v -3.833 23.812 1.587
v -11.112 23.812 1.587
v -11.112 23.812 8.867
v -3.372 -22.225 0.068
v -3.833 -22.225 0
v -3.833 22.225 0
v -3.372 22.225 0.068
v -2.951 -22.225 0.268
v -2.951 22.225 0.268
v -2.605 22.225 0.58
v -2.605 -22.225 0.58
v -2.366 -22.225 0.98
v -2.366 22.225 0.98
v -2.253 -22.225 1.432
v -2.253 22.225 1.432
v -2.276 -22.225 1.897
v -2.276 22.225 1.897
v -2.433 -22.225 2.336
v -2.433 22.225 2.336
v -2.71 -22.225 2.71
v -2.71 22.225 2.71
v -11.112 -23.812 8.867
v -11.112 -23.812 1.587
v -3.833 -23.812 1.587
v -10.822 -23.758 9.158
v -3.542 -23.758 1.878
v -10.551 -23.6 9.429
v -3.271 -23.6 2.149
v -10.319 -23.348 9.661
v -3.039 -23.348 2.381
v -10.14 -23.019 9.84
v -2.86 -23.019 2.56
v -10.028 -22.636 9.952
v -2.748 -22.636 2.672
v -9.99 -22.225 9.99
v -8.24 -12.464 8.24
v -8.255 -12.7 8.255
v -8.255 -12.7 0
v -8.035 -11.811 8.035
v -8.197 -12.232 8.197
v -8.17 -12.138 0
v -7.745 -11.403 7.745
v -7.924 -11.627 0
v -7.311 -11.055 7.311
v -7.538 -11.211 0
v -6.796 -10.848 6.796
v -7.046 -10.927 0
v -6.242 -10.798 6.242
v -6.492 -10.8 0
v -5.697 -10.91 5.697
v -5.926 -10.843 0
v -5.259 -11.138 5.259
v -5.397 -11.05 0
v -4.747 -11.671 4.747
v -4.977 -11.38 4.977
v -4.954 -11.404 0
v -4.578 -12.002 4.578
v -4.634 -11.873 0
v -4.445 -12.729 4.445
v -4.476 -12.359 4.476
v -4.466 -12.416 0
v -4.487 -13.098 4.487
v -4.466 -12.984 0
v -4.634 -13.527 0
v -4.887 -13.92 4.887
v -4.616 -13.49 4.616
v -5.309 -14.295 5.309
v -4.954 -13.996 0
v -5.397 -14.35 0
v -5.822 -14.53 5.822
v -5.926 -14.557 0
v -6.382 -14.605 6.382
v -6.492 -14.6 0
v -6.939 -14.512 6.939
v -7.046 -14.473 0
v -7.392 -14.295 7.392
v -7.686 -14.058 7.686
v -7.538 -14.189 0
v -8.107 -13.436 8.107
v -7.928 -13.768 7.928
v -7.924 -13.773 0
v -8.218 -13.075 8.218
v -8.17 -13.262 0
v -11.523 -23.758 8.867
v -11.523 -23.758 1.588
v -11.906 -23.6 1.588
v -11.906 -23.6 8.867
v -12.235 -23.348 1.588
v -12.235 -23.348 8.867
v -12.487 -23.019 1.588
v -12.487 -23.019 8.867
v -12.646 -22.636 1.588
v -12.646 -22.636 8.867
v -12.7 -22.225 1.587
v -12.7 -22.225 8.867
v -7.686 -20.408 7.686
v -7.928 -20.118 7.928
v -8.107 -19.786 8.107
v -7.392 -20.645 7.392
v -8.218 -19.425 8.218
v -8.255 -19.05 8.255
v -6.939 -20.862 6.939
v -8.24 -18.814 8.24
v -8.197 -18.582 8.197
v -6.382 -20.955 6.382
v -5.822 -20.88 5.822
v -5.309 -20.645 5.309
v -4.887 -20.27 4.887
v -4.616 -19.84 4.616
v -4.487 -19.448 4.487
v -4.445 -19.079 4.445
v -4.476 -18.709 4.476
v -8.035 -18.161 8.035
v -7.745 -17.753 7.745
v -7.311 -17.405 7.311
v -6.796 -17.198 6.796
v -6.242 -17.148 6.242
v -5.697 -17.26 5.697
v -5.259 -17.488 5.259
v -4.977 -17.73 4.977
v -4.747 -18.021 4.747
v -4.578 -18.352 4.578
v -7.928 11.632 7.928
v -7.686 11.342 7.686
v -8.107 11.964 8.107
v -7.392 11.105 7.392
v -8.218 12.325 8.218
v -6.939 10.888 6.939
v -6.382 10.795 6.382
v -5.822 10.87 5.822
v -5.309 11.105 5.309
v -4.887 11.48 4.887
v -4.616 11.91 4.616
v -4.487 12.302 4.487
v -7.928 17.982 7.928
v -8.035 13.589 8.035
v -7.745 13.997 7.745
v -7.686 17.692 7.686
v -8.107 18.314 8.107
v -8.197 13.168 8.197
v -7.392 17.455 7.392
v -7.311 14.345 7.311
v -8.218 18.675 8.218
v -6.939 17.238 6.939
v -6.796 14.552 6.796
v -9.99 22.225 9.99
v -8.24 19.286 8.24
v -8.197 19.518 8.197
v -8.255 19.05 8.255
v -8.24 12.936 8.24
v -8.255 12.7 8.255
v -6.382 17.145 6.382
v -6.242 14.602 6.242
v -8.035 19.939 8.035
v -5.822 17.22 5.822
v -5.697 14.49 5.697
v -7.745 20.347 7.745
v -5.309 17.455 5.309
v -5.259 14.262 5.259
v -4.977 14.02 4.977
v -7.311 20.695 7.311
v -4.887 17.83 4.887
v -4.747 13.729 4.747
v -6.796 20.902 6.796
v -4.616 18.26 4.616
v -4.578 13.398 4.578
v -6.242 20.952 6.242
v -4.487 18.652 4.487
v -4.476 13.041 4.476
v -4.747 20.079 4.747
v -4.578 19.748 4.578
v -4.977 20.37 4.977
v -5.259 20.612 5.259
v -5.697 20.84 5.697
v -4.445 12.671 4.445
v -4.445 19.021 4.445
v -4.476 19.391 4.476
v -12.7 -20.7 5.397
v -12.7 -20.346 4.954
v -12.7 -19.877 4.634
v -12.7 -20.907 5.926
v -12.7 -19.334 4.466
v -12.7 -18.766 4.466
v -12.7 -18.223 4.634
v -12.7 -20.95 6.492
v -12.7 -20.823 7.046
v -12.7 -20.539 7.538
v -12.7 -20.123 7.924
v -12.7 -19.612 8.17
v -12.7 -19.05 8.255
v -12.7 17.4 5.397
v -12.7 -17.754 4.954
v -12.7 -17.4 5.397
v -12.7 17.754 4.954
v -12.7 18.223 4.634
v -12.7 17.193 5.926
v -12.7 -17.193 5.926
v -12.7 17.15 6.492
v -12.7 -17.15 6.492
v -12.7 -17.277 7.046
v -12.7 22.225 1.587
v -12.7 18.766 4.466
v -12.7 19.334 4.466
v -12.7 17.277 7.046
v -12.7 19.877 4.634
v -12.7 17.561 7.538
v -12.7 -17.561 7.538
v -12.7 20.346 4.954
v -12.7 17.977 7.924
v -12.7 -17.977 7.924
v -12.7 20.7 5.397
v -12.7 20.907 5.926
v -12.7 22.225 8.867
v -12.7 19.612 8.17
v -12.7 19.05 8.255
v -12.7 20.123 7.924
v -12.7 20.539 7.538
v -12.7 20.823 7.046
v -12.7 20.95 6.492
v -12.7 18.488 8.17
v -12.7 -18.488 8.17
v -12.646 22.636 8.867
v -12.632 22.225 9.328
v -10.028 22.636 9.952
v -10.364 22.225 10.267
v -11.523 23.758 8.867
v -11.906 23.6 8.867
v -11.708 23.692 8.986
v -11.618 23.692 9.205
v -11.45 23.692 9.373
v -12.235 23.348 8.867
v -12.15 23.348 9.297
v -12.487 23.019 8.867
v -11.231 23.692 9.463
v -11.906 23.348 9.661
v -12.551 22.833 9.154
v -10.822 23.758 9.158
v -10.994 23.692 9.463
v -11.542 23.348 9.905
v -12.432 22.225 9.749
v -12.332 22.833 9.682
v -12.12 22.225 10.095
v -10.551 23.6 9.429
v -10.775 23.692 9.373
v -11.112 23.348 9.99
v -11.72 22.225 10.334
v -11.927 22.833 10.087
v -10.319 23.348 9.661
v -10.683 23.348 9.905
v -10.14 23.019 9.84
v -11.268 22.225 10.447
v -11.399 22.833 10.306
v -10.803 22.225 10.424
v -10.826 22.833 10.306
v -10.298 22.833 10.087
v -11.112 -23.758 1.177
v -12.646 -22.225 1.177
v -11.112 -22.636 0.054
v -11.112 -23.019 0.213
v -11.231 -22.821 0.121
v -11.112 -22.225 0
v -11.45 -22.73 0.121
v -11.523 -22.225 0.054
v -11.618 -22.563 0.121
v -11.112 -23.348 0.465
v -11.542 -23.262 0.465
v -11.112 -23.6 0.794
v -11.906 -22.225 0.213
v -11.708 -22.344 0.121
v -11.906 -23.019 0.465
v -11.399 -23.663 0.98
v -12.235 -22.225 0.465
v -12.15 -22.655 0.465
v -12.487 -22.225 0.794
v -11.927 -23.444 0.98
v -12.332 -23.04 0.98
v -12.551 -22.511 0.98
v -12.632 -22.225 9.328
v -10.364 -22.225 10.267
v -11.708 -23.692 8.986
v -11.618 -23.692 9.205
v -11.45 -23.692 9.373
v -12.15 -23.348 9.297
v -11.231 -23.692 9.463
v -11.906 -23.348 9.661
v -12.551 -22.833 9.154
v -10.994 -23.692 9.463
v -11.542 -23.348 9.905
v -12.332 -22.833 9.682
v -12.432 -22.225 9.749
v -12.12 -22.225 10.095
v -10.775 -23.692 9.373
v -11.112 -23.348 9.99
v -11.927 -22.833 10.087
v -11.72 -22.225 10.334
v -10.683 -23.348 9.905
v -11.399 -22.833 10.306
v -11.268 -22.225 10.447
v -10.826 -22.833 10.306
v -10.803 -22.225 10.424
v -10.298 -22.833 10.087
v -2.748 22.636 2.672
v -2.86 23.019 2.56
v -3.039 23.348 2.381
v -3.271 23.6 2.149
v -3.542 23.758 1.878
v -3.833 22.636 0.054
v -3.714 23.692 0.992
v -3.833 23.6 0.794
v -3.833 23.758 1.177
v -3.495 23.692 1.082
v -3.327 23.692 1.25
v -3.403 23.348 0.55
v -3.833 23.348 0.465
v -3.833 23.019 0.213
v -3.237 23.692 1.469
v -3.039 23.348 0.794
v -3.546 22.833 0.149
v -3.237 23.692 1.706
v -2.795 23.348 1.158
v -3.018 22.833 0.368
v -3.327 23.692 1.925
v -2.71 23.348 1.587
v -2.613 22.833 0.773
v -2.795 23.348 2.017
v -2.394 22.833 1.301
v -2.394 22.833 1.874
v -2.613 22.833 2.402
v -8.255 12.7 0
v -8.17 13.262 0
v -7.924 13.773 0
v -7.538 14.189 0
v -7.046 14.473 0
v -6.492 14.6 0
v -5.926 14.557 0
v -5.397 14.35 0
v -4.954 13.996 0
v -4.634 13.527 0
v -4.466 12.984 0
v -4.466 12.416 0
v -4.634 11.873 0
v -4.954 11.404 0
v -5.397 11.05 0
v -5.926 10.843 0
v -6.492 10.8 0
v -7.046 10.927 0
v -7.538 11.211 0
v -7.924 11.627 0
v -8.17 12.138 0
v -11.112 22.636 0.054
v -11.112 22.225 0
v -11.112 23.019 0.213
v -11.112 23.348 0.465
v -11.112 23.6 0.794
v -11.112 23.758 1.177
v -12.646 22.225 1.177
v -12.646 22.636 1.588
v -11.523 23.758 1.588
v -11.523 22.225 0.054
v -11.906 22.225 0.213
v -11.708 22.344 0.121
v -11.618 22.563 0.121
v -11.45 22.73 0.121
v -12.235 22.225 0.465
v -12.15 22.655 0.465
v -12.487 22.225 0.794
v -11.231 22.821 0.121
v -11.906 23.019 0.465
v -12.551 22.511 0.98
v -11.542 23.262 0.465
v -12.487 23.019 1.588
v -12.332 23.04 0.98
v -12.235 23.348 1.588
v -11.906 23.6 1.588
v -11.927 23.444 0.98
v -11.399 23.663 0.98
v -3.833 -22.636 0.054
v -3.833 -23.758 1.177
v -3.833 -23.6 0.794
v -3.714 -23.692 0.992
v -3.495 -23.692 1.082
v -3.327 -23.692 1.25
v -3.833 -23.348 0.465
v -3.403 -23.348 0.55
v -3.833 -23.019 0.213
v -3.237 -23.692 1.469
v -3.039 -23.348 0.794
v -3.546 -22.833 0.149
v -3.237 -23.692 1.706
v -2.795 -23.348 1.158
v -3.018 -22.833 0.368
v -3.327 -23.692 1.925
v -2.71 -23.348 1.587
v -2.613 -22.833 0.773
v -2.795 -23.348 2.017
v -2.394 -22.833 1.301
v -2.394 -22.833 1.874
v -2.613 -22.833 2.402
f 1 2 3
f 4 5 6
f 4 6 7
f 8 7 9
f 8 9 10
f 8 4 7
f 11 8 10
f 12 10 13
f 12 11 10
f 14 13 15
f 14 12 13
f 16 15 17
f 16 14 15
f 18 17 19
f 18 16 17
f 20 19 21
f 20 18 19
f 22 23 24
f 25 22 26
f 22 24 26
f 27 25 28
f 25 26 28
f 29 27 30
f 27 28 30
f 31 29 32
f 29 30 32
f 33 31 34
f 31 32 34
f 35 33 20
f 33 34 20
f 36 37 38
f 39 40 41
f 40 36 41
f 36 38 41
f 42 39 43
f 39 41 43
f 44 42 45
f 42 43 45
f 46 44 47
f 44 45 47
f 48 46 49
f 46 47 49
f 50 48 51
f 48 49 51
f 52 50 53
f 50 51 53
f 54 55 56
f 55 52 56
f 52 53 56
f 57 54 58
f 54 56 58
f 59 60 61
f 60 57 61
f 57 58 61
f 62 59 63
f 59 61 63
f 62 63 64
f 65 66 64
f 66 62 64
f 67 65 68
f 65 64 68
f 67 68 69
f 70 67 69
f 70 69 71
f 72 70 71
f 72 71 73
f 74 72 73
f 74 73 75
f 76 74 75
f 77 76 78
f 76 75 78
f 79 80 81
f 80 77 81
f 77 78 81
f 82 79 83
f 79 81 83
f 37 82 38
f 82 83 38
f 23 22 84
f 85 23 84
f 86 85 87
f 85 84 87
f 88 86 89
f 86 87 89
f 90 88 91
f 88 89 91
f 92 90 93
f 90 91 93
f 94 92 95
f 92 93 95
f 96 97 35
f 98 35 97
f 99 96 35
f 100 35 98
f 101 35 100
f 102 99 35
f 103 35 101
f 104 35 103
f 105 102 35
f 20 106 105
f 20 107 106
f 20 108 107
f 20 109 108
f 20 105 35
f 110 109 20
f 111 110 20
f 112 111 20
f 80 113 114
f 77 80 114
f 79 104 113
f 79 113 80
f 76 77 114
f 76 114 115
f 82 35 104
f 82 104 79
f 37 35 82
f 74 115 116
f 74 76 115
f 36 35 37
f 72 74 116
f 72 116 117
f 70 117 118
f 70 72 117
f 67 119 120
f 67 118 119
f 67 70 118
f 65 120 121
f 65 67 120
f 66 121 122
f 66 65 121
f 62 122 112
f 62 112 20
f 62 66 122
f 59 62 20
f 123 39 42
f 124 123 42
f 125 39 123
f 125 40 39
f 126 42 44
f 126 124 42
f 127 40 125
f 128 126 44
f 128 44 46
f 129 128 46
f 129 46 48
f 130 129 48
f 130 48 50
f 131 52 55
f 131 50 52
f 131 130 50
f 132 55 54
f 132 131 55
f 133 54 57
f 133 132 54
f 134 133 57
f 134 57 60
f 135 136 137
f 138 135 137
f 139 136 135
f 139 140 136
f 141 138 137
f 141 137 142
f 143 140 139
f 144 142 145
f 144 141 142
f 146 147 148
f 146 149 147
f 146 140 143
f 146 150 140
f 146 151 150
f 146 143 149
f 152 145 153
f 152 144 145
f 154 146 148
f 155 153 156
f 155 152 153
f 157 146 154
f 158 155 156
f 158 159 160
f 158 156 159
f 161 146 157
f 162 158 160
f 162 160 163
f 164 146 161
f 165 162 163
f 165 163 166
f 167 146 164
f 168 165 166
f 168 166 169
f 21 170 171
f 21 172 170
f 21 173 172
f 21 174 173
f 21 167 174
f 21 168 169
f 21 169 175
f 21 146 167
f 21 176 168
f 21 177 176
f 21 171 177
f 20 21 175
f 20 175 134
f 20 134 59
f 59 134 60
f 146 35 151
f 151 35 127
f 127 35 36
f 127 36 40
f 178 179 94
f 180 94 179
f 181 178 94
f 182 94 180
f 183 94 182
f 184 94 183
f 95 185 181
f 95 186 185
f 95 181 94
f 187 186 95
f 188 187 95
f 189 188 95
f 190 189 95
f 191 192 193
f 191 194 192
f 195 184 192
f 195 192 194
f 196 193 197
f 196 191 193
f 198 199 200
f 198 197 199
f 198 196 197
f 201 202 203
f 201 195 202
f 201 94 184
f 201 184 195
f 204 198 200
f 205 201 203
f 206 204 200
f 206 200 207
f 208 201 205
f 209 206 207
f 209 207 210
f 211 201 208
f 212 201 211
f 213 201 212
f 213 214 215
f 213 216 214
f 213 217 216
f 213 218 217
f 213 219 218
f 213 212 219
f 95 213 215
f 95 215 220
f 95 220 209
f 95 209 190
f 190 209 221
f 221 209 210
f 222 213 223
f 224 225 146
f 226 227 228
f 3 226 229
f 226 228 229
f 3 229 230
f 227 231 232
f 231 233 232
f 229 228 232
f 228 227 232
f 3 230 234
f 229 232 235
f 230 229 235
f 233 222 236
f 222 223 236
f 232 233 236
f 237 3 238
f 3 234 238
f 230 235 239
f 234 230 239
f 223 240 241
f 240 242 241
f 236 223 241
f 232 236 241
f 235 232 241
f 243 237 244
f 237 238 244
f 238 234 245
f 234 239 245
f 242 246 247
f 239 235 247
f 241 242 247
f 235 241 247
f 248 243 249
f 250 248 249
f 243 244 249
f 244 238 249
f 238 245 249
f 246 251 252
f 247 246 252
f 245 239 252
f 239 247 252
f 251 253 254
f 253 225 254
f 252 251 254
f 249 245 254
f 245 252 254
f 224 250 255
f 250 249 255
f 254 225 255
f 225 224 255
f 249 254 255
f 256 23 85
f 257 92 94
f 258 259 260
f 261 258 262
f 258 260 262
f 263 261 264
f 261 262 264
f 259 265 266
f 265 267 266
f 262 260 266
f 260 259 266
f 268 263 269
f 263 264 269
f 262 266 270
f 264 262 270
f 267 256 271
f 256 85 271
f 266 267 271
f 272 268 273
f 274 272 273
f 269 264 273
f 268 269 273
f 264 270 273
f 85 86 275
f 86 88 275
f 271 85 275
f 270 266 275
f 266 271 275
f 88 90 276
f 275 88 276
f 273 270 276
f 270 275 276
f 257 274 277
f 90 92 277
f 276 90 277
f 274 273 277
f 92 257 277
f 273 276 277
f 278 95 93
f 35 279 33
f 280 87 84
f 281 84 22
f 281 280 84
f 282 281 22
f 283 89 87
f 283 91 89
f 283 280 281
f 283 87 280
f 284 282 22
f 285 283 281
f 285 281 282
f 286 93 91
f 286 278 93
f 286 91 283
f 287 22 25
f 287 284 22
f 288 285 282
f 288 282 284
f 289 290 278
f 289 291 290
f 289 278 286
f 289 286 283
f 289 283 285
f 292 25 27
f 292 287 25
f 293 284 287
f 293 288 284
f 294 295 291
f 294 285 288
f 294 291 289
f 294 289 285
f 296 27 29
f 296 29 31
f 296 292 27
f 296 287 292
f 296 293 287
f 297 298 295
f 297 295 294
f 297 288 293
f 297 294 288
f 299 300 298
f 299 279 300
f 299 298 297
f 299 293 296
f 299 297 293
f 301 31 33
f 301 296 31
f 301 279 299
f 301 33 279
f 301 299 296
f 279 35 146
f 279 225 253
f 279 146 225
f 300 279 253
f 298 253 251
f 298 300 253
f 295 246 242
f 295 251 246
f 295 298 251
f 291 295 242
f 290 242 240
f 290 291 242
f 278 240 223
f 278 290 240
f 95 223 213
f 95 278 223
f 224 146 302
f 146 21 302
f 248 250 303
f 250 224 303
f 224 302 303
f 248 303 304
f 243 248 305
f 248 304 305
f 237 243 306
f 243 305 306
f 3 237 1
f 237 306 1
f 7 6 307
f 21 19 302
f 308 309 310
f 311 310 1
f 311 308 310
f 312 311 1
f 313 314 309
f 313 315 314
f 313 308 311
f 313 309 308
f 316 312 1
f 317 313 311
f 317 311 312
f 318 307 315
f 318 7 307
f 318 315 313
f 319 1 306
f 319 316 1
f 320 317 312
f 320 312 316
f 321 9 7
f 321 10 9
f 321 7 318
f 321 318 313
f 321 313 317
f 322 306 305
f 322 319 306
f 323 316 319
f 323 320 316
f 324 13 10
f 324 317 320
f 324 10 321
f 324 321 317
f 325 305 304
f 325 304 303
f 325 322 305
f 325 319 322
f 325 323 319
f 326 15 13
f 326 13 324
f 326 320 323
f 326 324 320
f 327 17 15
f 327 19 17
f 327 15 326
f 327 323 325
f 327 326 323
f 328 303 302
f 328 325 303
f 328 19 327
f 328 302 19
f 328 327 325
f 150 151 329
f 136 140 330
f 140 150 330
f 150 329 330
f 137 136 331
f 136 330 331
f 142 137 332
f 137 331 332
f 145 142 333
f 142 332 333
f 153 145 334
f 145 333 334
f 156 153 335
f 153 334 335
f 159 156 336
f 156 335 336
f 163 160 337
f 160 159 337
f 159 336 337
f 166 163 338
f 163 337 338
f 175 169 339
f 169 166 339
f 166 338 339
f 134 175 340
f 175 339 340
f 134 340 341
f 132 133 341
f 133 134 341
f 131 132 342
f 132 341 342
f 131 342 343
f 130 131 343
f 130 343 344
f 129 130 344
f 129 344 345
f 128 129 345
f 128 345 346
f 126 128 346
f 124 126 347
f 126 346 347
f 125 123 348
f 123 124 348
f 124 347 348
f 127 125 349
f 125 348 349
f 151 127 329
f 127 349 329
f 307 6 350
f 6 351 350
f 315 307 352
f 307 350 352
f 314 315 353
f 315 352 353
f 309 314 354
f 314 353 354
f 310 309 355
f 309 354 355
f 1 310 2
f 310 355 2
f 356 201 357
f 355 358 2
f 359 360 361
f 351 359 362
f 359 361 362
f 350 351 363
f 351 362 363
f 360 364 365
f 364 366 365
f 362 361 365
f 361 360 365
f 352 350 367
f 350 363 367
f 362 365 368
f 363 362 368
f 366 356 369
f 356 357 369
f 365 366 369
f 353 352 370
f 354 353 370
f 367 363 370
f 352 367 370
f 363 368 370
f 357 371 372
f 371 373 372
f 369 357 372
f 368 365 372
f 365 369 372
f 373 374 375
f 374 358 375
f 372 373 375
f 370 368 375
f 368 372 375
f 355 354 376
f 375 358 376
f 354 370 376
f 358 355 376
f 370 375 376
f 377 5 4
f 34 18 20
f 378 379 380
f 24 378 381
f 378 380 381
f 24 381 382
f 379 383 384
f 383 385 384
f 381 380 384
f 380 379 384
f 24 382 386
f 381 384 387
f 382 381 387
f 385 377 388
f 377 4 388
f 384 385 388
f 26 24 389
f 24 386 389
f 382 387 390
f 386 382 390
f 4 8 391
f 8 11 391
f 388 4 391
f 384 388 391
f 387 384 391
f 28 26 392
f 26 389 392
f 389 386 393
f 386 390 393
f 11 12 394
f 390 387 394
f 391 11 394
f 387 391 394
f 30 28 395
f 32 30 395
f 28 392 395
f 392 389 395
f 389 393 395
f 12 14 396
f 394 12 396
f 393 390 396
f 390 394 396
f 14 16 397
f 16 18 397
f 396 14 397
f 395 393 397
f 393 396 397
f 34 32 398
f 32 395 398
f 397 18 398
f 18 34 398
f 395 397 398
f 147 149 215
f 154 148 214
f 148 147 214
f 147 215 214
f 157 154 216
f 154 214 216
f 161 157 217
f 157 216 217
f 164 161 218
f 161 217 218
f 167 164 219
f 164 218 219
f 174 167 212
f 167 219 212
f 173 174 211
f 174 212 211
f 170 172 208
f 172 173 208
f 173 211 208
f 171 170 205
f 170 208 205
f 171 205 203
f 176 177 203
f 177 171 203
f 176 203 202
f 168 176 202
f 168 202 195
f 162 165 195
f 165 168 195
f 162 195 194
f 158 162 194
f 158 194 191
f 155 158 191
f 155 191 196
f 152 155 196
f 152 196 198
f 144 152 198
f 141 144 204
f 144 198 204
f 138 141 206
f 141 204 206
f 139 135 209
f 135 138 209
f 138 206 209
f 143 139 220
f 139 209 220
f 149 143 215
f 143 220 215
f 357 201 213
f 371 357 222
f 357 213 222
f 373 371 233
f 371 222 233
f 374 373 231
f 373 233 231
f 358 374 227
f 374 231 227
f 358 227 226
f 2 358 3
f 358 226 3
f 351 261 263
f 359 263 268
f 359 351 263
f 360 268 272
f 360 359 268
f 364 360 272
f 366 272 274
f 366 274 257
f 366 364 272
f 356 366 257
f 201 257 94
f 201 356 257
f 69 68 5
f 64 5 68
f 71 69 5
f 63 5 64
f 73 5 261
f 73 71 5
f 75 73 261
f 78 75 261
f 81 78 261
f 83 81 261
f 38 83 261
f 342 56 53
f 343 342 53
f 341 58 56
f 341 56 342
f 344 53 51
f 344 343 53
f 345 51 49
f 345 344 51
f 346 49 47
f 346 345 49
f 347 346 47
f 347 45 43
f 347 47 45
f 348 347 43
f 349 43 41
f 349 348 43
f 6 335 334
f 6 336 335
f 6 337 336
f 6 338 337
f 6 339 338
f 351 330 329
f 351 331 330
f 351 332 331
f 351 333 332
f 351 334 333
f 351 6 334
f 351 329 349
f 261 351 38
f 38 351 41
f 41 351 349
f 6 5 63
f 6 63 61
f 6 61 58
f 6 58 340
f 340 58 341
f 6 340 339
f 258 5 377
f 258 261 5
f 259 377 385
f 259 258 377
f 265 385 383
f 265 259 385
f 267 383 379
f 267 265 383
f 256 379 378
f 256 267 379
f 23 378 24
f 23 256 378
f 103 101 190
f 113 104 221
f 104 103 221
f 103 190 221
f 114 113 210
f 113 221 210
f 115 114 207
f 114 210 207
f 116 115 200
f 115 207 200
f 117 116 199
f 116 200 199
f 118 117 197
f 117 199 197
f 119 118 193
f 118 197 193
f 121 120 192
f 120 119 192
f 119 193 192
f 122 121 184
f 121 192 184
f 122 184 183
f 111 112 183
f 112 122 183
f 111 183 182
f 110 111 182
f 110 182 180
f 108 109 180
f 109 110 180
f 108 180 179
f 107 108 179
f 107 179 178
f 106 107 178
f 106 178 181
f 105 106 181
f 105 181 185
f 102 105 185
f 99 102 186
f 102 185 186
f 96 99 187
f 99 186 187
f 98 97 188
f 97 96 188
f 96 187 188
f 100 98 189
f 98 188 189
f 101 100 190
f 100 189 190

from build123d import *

# Parameters (mm, degrees)
BOSS_EXTRUDE1_DEPTH = 23.8125
SKETCH2_R           = 1.905
CUT_EXTRUDE1_DEPTH  = 30.826417087
SKETCH3_R           = 1.905
CUT_EXTRUDE2_DEPTH  = 30.826417087
FILLET1_R           = 1.5875


with BuildPart() as part:
    # Sketch1 → Boss-Extrude1 (new, symmetric)
    with BuildSketch(Plane(origin=(0, 0, 0), x_dir=(1, 0, 0), z_dir=(0, 1, 0))):
        Polygon((0, 0), (-12.7, 0), (-12.7, -12.7), align=None)
    extrude(amount=BOSS_EXTRUDE1_DEPTH, both=True)

    # Sketch2 → Cut-Extrude1 (cut, through all)
    with BuildSketch(Plane.ZY.offset(12.7)):
        with Locations((6.35, 19.05)):
            Circle(SKETCH2_R)
        with Locations((6.35, -19.05)):
            Circle(SKETCH2_R)
    extrude(amount=-CUT_EXTRUDE1_DEPTH, mode=Mode.SUBTRACT)

    # Sketch3 → Cut-Extrude2 (cut, through all)
    with BuildSketch(Plane(origin=(0, 0, 0), x_dir=(-1, 0, 0), z_dir=(0, 0, -1))):
        with Locations((6.35, -12.7)):
            Circle(SKETCH3_R)
        with Locations((6.35, 12.7)):
            Circle(SKETCH3_R)
    extrude(amount=-CUT_EXTRUDE2_DEPTH, mode=Mode.SUBTRACT)

    # Fillet1
    fillet1_edges = [part.edges().sort_by_distance(p)[0] for p in [
        (-12.7, 23.8125, 6.35),
        (-12.7, -23.8125, 6.35),
        (-6.35, -23.8125, 0),
        (-6.35, -23.8125, 6.35),
        (-6.35, 23.8125, 6.35),
        (-12.7, 0, 12.7),
        (-12.7, 0, 0),
        (0, 0, 0),
        (-6.35, 23.8125, 0),
    ]]
    fillet(fillet1_edges, radius=FILLET1_R)


solid = part.part
